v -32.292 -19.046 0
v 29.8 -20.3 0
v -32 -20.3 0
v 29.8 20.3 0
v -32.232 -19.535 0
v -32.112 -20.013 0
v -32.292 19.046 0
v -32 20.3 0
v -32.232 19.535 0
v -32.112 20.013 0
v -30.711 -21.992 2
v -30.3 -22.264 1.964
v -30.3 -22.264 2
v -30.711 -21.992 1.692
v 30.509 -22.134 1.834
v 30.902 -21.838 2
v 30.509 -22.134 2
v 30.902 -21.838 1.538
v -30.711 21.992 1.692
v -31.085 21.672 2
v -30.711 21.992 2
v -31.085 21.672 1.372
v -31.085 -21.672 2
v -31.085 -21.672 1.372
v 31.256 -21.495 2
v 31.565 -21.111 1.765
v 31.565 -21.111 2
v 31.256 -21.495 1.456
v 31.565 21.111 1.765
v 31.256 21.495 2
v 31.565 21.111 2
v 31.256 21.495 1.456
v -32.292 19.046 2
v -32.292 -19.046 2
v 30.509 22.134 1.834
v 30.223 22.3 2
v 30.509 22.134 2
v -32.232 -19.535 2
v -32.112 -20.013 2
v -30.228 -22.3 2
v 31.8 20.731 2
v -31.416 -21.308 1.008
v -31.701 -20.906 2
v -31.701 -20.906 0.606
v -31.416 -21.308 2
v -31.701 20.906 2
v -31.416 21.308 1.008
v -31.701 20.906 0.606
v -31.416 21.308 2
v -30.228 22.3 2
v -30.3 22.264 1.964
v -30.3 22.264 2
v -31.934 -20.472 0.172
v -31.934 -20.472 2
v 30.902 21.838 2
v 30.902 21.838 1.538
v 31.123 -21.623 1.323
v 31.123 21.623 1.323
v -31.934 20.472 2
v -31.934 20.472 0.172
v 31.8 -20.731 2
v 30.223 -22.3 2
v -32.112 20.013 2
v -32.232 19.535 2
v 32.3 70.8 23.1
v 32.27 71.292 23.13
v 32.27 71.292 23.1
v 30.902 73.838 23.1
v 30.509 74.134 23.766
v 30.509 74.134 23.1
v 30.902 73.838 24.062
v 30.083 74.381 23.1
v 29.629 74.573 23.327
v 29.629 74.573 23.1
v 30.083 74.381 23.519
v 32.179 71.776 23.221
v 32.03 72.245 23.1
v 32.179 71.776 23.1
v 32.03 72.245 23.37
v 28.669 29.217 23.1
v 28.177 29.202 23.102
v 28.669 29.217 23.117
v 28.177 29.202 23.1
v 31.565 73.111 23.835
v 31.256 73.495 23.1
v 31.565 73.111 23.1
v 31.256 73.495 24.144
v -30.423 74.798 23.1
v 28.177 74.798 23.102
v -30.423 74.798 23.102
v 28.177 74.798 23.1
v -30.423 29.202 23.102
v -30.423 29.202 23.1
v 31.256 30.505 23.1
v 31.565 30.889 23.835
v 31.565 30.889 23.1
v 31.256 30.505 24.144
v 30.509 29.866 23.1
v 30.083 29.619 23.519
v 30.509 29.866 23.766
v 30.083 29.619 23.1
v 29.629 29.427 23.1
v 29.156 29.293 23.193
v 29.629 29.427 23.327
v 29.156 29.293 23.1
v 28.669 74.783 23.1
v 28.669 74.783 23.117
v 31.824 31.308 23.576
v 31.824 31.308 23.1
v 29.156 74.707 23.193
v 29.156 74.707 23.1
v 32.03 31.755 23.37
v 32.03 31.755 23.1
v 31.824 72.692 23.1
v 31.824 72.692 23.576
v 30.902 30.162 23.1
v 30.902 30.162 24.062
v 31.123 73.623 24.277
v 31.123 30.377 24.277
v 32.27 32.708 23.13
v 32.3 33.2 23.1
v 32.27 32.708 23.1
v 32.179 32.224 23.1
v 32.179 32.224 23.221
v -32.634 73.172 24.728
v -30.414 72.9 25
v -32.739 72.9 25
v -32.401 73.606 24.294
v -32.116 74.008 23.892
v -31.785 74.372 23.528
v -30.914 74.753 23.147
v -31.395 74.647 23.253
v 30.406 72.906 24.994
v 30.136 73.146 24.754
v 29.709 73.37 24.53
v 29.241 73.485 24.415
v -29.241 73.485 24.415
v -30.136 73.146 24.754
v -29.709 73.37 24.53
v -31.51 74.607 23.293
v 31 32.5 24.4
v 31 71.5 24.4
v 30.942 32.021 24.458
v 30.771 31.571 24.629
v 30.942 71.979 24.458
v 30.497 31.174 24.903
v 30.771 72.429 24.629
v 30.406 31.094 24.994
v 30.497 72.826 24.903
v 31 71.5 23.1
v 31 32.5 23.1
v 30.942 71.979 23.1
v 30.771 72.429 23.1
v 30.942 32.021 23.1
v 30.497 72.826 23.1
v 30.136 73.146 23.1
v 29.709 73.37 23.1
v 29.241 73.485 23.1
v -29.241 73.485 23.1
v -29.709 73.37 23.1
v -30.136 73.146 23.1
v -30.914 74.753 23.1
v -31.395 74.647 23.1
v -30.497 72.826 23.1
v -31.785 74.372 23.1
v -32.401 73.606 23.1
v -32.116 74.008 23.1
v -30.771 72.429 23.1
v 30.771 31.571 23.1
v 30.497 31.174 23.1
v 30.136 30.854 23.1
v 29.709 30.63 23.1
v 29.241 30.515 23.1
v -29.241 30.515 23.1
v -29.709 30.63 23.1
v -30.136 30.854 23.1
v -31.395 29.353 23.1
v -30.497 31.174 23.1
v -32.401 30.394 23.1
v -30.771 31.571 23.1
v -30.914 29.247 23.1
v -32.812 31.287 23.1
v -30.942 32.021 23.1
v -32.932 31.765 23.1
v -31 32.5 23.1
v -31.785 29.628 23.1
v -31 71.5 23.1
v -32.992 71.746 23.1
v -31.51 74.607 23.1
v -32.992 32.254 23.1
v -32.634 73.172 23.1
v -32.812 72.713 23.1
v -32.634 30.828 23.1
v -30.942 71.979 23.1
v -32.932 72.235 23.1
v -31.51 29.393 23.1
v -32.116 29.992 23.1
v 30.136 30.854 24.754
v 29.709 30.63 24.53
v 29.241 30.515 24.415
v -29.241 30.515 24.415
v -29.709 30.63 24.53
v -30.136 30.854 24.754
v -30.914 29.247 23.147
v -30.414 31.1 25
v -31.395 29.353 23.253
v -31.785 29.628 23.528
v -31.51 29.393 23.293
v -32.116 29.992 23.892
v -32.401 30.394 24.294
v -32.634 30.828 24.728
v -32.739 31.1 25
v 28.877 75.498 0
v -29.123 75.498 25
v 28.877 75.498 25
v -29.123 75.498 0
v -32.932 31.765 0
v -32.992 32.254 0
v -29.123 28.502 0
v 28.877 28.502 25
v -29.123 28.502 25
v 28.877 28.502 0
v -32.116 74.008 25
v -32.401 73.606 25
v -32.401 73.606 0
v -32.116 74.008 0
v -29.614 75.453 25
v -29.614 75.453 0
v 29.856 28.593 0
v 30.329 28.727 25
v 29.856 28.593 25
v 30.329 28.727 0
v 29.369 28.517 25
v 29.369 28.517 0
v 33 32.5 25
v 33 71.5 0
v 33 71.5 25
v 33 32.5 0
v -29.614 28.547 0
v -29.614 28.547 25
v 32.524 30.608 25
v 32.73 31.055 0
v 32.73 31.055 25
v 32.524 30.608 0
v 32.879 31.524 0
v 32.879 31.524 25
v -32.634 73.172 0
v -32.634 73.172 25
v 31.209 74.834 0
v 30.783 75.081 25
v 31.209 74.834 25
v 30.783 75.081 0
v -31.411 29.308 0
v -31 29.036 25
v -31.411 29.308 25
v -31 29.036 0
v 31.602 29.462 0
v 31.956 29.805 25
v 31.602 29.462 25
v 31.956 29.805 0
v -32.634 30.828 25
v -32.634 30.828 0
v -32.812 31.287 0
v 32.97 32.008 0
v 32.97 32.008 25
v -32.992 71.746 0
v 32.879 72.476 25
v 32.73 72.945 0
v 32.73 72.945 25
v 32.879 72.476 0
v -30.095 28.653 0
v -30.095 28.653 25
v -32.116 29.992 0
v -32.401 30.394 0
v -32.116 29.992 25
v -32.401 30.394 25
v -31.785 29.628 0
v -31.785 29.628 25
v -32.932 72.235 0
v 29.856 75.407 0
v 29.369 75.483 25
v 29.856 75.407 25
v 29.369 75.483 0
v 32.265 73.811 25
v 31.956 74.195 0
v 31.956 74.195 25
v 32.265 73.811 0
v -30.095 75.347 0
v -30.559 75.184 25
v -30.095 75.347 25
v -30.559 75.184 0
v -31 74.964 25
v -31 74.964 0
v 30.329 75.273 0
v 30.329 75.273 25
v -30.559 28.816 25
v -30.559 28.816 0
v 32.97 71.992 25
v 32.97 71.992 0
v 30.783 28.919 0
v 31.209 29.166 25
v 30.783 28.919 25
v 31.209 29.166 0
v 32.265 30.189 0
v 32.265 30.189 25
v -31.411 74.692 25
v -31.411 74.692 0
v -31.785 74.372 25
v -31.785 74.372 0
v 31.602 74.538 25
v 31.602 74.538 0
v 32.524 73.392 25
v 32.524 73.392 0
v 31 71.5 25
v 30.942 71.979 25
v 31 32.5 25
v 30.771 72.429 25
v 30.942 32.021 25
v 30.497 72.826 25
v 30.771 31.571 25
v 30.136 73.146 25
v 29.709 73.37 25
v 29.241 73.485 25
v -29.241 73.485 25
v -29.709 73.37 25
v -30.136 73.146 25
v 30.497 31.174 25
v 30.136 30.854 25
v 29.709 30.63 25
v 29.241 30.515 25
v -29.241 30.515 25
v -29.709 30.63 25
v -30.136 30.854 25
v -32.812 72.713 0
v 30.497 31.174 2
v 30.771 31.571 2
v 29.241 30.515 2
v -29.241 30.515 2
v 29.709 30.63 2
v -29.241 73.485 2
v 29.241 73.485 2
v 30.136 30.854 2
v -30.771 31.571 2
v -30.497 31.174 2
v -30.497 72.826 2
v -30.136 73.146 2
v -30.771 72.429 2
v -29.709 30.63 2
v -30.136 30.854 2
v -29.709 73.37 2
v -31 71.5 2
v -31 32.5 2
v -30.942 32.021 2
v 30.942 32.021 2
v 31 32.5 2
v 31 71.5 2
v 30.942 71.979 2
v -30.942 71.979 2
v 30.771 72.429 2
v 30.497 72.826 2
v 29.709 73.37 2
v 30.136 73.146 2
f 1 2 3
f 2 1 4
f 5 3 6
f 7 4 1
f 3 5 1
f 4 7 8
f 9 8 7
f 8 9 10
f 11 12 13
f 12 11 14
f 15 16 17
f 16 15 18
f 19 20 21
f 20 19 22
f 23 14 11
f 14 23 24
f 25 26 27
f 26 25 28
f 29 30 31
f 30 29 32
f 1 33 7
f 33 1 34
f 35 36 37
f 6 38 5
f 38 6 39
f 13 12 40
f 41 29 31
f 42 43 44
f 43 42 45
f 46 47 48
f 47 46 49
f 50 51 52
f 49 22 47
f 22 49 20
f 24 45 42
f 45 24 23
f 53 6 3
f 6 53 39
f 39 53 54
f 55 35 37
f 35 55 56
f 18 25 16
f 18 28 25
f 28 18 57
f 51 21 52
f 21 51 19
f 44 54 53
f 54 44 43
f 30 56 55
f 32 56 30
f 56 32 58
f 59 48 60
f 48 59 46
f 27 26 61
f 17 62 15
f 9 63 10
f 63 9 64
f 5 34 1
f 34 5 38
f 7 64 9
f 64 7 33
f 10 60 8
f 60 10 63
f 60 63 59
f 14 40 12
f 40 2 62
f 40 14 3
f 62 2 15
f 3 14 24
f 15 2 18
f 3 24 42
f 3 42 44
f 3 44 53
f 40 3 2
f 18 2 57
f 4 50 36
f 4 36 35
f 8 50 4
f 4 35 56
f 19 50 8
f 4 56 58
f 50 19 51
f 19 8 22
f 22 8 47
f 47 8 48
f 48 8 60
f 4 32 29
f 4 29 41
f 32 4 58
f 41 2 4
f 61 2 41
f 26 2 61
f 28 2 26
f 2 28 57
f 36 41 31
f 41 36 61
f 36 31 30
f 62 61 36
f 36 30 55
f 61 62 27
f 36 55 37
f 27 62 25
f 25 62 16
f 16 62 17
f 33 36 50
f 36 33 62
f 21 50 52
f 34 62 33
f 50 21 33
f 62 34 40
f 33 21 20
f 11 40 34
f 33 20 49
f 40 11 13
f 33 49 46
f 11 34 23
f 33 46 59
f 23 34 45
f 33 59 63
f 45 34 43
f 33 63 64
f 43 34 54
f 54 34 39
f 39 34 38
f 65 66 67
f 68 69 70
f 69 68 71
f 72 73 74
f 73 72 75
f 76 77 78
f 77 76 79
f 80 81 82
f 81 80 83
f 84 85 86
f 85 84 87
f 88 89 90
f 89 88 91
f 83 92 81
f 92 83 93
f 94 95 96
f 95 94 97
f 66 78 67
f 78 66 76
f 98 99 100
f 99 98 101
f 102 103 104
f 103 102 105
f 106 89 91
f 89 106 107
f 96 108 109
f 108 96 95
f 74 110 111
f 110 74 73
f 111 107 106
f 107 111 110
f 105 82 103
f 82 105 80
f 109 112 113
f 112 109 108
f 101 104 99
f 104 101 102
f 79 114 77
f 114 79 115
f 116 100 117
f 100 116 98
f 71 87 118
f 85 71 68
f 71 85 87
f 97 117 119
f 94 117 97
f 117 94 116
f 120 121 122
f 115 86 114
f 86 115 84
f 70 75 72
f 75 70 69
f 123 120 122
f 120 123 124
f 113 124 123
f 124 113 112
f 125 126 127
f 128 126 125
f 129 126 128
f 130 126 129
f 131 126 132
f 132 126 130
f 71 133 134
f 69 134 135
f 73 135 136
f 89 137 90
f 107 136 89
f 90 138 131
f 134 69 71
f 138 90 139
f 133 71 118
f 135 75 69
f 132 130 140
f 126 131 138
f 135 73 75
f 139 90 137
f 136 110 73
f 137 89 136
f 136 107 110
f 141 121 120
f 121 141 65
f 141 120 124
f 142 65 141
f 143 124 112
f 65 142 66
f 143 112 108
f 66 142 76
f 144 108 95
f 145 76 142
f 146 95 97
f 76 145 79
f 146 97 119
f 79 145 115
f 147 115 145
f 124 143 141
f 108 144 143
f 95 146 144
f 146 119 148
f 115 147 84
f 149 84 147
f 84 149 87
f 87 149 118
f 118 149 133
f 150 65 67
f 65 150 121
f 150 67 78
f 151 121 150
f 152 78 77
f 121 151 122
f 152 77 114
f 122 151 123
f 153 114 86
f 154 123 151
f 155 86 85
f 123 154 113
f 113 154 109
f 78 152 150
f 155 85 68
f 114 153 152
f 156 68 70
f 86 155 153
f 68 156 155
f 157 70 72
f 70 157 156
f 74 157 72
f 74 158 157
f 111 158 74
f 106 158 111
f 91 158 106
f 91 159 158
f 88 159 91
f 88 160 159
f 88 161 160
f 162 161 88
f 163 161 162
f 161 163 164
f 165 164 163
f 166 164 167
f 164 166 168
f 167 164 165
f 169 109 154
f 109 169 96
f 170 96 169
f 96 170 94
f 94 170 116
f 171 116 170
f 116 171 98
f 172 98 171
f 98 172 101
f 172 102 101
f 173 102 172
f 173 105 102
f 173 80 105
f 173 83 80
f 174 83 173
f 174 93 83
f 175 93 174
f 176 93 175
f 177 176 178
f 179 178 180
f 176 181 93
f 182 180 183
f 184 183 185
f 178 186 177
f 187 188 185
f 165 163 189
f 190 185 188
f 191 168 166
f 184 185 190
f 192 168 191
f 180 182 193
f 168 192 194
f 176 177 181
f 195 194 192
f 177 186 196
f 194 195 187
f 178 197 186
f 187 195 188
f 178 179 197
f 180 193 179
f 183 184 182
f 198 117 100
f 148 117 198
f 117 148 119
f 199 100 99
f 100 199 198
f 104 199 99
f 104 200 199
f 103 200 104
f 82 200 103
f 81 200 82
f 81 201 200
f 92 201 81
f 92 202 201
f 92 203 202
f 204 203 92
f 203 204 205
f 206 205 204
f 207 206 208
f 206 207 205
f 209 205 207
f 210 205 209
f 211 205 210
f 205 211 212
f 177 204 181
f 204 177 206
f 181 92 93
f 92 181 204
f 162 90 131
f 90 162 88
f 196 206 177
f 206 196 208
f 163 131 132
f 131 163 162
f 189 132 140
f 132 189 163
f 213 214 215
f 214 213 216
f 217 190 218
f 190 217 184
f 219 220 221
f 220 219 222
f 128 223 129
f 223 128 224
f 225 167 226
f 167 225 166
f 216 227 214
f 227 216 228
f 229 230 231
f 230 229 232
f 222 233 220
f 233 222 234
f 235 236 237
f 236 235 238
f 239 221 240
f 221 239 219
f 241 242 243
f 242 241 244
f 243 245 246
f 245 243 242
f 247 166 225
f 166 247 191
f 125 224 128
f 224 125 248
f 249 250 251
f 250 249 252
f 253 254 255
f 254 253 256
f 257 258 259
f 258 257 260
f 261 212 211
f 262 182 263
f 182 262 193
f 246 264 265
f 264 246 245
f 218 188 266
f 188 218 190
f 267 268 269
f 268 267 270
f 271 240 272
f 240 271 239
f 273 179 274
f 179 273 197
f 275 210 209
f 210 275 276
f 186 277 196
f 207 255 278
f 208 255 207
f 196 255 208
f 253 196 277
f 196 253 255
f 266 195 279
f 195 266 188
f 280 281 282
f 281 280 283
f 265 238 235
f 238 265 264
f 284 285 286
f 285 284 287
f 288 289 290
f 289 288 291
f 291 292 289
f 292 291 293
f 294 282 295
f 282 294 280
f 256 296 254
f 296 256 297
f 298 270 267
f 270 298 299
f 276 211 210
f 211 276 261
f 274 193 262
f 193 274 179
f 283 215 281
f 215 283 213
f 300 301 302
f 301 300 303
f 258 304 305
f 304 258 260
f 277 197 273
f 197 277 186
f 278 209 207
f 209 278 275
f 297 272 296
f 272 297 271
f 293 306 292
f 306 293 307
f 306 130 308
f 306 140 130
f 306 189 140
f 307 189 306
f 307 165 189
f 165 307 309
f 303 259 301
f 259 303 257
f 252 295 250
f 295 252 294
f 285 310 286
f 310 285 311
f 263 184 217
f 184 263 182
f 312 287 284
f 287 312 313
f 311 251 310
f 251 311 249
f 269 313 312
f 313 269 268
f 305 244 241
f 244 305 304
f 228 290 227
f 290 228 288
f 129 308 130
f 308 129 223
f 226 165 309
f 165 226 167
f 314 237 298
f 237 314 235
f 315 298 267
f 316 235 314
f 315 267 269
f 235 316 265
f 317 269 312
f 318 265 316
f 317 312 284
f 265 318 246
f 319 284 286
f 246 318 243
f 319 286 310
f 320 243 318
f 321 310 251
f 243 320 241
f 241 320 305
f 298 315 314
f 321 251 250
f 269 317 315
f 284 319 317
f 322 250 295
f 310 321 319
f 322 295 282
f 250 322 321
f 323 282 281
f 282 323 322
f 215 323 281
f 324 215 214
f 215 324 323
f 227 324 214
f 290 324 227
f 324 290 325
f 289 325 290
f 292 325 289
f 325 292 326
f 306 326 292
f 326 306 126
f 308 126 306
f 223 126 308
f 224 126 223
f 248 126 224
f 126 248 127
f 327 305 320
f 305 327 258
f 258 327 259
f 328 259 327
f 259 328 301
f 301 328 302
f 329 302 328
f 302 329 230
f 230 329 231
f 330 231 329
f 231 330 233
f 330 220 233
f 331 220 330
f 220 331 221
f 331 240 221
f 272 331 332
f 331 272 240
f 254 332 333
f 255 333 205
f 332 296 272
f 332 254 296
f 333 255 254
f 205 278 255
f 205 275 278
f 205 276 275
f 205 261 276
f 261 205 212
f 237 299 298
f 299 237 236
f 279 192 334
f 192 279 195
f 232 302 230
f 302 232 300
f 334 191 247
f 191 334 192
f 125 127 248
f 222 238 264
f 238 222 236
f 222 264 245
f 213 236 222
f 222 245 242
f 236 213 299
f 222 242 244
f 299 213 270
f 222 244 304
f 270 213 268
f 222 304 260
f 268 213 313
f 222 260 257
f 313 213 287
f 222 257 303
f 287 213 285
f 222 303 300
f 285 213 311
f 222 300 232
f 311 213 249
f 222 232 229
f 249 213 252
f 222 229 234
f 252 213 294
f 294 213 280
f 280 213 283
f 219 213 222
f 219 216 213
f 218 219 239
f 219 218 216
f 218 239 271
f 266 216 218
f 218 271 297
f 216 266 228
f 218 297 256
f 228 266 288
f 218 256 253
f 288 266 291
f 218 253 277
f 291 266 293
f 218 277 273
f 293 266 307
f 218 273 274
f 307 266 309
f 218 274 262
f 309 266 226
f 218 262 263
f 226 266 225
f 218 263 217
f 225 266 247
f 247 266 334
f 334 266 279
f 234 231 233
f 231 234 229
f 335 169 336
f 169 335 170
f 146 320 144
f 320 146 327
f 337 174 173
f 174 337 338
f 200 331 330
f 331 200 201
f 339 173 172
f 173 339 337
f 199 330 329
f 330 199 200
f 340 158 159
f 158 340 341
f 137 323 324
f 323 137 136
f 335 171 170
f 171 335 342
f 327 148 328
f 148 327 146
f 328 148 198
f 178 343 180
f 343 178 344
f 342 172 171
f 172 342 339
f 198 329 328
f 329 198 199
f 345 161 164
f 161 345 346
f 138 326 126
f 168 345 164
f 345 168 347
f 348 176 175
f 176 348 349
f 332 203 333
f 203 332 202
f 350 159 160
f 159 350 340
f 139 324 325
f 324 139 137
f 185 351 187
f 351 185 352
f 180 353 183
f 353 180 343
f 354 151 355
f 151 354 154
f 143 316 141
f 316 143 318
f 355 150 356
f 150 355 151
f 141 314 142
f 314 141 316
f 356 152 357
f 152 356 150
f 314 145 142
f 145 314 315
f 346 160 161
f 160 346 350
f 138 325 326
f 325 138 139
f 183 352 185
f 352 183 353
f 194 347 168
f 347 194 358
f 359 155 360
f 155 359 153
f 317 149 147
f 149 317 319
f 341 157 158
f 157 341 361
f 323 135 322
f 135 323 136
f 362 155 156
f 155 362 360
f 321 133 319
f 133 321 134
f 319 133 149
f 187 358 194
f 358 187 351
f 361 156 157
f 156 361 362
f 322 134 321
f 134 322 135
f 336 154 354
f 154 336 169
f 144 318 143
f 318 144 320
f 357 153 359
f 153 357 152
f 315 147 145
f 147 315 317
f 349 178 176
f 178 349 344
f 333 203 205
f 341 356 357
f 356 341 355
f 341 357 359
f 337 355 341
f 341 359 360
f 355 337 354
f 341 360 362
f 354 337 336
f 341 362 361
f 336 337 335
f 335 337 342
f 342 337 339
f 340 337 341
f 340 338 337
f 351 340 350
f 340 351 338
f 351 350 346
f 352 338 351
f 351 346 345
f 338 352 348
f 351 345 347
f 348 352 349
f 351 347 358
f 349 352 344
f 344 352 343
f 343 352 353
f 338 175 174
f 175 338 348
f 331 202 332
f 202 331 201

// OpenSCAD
// [FL_INDEX: keywords="openscad, 3d_parametric, Parametric_Rounded_Sliding_Top_Box, csg_solid" | COT="Parametric OpenSCAD design from 3DCodeverse"]
// Title: Parametric Rounded Sliding Top Box

// ===== file: sliding_lid_box_round.scad =====
//parametic rounded sliding lid & box
//john finch 12-1-13


//User Inputs
width = 30;
len = 76;
height =22;
thickness = 2;
min_wall = 0.7; //remaining wall thickness inside lid groove
radius = 4; // .1 to say 10
//End of user inputs

x1 = len/2;
y1 = width/2;
z1 = 0;


x2 = x1 - thickness;
y2 = y1 - thickness;
z2 = z1 + thickness;

echo (x1,x2,y1,y2);




module roundedRect(size, radius)  //modified William A Adams roundedrect.scad
{
x = size[0];
y = size[1];
z = size[2];


echo (x, y, z, radius);

linear_extrude(height=z)
hull()
{
// place 4 circles in the corners, with the given radius
translate([(-x/2)+(radius), (-y/2)+(radius), 0])
circle(r=radius);

translate([(x/2)-(radius), (-y/2)+(radius), 0])
circle(r=radius);

translate([(-x/2)+(radius), (y/2)-(radius), 0])
circle(r=radius);

translate([(x/2)-(radius), (y/2)-(radius), 0])
circle(r=radius);
}
}
module lid_trimmer(){
difference(){
	translate([-(len+5)/2,-(width+5)/2,0])
	cube([len+5,width+5,thickness+5]);
	roundedRect([len-2*min_wall,width-2*min_wall,thickness+5],radius);
	}

}

module lid(adjust){

difference(){
	polyhedron ( 
				points = [	[-x1,-y2+min_wall+adjust,0], 
							[x2-min_wall-adjust,-y2+min_wall+adjust,0],
							[x2-min_wall-adjust,y2-min_wall-adjust,0], 
							[-x1,y2-min_wall-adjust,0],
							[-x1,-y1+min_wall+adjust,z2],
							[x1-min_wall-adjust,-y1+min_wall+adjust,z2], 
							[x1-min_wall-adjust,y1-min_wall-adjust,z2], 
							[-x1,y1-min_wall-adjust,z2]], 

			triangles = [	[0,5,1], 
							[5,0,4], 
							[1,6,2], 
							[1,5,6], 
							[6,3,2], 
							[6,7,3], 
							[7,0	,3], 
							[4,0,7], 
							[4,6,5], 
							[6,4,7], 
							[0,1,2], 
							[0,2,3]]);
	lid_trimmer();
	}
}

module box() {
difference(){
	
	translate([0,5+width,0])
	roundedRect([len,width,height],radius);

	
	translate([0,5+width,thickness])
	roundedRect([len-2*thickness,width-2*thickness,height],radius-thickness);
	
	translate([0,5+width,height+.1])
	rotate([180,0,0])
	lid(0);
	//cut slot end open
	translate([-thickness,5+width,height+.1])
	rotate([180,0,0])
	lid(0);

	}
	/*
	translate([0,5+width,height+.1])
	rotate([180,0,0])
	lid(.5);
	*/

}

//print lid undersized in length by .5mm and width by 1.0 mm

lid(.5);
	
//lid_trimmer();
box();

// ===== file: sliding_lid_box_round_v1.1.scad =====
//parametic rounded sliding lid & box
//john finch 12-1-13

//Version 1.1 12-2-13
//Fixed problem of boxes being slightly under dimensioned due to too few
//facets in the rounded corners.  Reworked the roundedRect module to use
//cylinders with facet count control.  This took the steps out of the rounded
//corners and brought the outside dimensions closer to specified. Compile time 
//is increased.


//User Inputs
width = 47;
len = 66;
height =25;
thickness = 2;
min_wall = 0.7; //remaining wall thickness inside lid groove
radius = 4; // .1 to say 10
//End of user inputs

x1 = len/2;
y1 = width/2;
z1 = 0;


x2 = x1 - thickness;
y2 = y1 - thickness;
z2 = z1 + thickness;

echo (x1,x2,y1,y2);




module roundedRect(size, radius)  //modified William A Adams roundedrect.scad
{
x = size[0];
y = size[1];
z = size[2];
fa=0.01;
fs=0.5;
radius=max(0.1,radius);
radius=min(radius,10);
//echo ("Radius= ",radius);

//echo (x, y, z, radius);


hull()
	{
	translate([-x/2+radius,-y/2+radius,0])
	cylinder(h=z,r1=radius,r2=radius,$fa=1,$fs=fs);
	
	translate([x/2-radius,-y/2+radius,0])
	cylinder(h=z,r1=radius,r2=radius,$fa=1,$fs=fs);

	translate([-x/2+radius,y/2-radius,0])
	cylinder(h=z,r1=radius,r2=radius,$fa=1,$fs=fs);

	translate([x/2-radius,y/2-radius,0])
	cylinder(h=z,r1=radius,r2=radius,$fa=1,$fs=fs);

	}
}
module lid_trimmer(){
difference(){
	translate([-(len+5)/2,-(width+5)/2,0])
	cube([len+5,width+5,thickness+5]);
	roundedRect([len-2*min_wall,width-2*min_wall,thickness+5],radius);
	}

}

module lid(adjust){

difference(){
	polyhedron ( 
				points = [	[-x1,-y2+min_wall+adjust,0], 
							[x2-min_wall-adjust,-y2+min_wall+adjust,0],
							[x2-min_wall-adjust,y2-min_wall-adjust,0], 
							[-x1,y2-min_wall-adjust,0],
							[-x1,-y1+min_wall+adjust,z2],
							[x1-min_wall-adjust,-y1+min_wall+adjust,z2], 
							[x1-min_wall-adjust,y1-min_wall-adjust,z2], 
							[-x1,y1-min_wall-adjust,z2]], 

			triangles = [	[0,5,1], 
							[5,0,4], 
							[1,6,2], 
							[1,5,6], 
							[6,3,2], 
							[6,7,3], 
							[7,0	,3], 
							[4,0,7], 
							[4,6,5], 
							[6,4,7], 
							[0,1,2], 
							[0,2,3]]);
	lid_trimmer();
	}
}

module box() {
difference(){
	
	translate([0,5+width,0])
	roundedRect([len,width,height],radius);

	
	translate([0,5+width,thickness])
	roundedRect([len-2*thickness,width-2*thickness,height],radius-thickness);
	
	translate([0,5+width,height+.1])
	rotate([180,0,0])
	lid(0);
	//cut slot end open
	translate([-thickness,5+width,height+.1])
	rotate([180,0,0])
	lid(0);

	}
	/*
	translate([0,5+width,height+.1])
	rotate([180,0,0])
	lid(.5);
	*/

}

//print lid undersized in length by .5mm and width by 1.0 mm

lid(.5);
	
//lid_trimmer();
box();
